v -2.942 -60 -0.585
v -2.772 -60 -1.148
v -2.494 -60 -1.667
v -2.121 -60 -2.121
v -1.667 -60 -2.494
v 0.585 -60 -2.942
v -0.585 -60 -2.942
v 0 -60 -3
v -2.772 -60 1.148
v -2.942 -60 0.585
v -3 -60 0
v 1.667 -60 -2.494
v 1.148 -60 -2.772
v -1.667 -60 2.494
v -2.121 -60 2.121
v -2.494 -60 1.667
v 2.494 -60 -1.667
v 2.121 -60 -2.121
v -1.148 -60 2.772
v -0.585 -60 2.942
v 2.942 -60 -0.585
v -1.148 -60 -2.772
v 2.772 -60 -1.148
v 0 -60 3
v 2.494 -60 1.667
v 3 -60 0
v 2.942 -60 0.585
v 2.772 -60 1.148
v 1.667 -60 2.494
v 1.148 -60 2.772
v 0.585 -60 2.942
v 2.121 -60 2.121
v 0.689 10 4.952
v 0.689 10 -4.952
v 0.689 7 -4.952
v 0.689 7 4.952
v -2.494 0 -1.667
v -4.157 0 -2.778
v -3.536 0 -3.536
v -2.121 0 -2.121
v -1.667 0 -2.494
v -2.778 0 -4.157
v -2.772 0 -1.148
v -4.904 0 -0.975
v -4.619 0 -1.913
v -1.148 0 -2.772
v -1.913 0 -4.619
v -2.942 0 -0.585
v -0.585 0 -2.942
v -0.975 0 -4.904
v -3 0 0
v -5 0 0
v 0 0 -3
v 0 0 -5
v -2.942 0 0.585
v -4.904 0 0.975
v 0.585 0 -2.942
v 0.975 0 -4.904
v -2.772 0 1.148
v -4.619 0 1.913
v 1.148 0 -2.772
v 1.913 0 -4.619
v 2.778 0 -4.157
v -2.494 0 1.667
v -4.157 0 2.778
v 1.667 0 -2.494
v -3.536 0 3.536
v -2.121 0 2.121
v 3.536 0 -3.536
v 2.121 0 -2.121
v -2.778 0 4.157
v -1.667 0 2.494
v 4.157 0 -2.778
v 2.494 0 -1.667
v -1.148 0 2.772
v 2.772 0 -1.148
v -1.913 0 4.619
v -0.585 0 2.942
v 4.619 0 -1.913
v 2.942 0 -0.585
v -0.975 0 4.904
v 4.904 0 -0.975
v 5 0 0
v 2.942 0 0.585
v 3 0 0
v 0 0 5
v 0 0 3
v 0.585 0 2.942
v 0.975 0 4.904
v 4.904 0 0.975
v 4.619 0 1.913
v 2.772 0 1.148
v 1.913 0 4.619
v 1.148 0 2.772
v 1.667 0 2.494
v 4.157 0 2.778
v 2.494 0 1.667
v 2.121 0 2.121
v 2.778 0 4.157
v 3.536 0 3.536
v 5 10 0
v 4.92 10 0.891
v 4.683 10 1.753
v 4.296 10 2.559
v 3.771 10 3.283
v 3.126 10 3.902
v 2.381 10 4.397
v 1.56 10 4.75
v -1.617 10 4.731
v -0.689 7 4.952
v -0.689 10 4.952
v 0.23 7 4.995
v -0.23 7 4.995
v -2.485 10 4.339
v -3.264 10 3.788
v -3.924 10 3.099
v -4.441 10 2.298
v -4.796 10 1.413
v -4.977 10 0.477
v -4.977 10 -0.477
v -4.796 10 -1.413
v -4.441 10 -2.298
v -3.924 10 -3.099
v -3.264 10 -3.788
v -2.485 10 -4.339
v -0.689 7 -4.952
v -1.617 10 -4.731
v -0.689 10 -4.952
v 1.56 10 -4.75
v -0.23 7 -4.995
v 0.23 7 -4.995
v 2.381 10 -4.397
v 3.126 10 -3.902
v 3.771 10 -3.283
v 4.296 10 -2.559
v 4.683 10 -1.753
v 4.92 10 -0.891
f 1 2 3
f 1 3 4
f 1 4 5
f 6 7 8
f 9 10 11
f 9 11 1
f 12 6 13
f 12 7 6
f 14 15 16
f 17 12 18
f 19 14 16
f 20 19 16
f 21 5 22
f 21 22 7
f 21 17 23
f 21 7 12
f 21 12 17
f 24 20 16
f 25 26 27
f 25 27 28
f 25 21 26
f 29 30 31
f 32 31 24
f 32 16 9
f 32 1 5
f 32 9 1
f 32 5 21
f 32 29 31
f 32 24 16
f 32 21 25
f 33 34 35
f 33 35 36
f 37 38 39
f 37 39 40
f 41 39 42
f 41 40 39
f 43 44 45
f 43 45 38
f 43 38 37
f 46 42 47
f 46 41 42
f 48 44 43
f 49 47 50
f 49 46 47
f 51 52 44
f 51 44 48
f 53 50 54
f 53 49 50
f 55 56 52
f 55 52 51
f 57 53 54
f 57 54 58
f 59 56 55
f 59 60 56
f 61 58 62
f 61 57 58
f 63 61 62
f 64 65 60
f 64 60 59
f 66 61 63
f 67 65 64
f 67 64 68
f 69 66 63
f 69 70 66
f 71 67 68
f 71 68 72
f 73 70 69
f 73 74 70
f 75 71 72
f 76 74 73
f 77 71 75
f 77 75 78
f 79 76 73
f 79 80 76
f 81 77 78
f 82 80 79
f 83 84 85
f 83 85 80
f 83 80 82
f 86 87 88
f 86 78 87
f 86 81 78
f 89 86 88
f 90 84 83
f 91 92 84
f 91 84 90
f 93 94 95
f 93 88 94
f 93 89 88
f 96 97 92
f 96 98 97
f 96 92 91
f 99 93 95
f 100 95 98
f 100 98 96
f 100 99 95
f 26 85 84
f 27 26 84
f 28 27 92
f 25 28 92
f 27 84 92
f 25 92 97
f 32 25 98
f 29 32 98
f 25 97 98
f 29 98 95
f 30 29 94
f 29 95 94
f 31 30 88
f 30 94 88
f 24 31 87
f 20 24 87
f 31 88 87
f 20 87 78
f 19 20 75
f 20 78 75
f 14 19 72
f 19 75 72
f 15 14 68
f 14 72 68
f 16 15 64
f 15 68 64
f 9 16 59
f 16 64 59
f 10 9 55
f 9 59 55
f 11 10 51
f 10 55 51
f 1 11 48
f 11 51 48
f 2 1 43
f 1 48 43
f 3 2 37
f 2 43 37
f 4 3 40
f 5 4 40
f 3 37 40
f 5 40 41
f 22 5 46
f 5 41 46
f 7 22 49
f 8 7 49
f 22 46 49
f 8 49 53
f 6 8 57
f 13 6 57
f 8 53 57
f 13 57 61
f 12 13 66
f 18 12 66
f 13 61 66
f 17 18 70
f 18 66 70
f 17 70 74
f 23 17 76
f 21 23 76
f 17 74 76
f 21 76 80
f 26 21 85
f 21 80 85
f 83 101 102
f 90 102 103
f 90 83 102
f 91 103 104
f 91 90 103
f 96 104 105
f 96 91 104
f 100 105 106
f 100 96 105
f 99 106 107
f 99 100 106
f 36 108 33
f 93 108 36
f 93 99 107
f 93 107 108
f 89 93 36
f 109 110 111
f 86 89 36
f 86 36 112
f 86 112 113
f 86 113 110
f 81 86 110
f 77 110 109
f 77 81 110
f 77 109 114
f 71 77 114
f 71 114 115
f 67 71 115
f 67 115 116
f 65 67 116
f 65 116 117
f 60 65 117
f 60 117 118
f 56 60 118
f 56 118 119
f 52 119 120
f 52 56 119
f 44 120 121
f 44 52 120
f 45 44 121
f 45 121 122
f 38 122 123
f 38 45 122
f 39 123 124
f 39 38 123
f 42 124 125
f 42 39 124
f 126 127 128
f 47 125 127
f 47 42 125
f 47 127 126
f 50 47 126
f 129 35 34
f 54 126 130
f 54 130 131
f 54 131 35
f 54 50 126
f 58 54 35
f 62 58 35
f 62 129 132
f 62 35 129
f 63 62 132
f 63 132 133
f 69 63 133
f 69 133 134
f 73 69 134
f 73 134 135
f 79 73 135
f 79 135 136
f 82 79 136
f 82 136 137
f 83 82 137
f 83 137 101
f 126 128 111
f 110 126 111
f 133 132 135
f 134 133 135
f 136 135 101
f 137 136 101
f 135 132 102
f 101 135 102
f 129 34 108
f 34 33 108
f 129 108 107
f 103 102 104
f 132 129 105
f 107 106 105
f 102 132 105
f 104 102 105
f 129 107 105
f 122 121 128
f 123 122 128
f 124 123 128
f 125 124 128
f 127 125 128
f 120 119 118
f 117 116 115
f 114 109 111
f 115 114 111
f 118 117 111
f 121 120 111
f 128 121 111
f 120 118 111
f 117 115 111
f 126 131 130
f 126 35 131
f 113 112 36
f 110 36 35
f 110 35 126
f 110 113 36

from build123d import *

# Parameters (mm, degrees)
F0_R     = 3
F1_DEPTH = 60
F2_R     = 5
F3_DEPTH = 10
F4_W     = 1.377778
F4_H     = 10
F5_DEPTH = 3


with BuildPart() as f1:
    # F0 (on Front) → F1 (new body)
    with BuildSketch(Plane.XZ):
        Circle(F0_R)
    extrude(amount=F1_DEPTH)

    # F2 (on Front) → F3 (join)
    with BuildSketch(Plane.XZ):
        Circle(F2_R)
    extrude(amount=-F3_DEPTH)

    # F4 (on face) → F5 (cut)
    with BuildSketch(Plane(origin=(0, 10, 0), x_dir=(-1, 0, 0), z_dir=(0, 1, 0))):
        Rectangle(F4_W, F4_H)
    extrude(amount=-F5_DEPTH, mode=Mode.SUBTRACT)


solid = f1.part
